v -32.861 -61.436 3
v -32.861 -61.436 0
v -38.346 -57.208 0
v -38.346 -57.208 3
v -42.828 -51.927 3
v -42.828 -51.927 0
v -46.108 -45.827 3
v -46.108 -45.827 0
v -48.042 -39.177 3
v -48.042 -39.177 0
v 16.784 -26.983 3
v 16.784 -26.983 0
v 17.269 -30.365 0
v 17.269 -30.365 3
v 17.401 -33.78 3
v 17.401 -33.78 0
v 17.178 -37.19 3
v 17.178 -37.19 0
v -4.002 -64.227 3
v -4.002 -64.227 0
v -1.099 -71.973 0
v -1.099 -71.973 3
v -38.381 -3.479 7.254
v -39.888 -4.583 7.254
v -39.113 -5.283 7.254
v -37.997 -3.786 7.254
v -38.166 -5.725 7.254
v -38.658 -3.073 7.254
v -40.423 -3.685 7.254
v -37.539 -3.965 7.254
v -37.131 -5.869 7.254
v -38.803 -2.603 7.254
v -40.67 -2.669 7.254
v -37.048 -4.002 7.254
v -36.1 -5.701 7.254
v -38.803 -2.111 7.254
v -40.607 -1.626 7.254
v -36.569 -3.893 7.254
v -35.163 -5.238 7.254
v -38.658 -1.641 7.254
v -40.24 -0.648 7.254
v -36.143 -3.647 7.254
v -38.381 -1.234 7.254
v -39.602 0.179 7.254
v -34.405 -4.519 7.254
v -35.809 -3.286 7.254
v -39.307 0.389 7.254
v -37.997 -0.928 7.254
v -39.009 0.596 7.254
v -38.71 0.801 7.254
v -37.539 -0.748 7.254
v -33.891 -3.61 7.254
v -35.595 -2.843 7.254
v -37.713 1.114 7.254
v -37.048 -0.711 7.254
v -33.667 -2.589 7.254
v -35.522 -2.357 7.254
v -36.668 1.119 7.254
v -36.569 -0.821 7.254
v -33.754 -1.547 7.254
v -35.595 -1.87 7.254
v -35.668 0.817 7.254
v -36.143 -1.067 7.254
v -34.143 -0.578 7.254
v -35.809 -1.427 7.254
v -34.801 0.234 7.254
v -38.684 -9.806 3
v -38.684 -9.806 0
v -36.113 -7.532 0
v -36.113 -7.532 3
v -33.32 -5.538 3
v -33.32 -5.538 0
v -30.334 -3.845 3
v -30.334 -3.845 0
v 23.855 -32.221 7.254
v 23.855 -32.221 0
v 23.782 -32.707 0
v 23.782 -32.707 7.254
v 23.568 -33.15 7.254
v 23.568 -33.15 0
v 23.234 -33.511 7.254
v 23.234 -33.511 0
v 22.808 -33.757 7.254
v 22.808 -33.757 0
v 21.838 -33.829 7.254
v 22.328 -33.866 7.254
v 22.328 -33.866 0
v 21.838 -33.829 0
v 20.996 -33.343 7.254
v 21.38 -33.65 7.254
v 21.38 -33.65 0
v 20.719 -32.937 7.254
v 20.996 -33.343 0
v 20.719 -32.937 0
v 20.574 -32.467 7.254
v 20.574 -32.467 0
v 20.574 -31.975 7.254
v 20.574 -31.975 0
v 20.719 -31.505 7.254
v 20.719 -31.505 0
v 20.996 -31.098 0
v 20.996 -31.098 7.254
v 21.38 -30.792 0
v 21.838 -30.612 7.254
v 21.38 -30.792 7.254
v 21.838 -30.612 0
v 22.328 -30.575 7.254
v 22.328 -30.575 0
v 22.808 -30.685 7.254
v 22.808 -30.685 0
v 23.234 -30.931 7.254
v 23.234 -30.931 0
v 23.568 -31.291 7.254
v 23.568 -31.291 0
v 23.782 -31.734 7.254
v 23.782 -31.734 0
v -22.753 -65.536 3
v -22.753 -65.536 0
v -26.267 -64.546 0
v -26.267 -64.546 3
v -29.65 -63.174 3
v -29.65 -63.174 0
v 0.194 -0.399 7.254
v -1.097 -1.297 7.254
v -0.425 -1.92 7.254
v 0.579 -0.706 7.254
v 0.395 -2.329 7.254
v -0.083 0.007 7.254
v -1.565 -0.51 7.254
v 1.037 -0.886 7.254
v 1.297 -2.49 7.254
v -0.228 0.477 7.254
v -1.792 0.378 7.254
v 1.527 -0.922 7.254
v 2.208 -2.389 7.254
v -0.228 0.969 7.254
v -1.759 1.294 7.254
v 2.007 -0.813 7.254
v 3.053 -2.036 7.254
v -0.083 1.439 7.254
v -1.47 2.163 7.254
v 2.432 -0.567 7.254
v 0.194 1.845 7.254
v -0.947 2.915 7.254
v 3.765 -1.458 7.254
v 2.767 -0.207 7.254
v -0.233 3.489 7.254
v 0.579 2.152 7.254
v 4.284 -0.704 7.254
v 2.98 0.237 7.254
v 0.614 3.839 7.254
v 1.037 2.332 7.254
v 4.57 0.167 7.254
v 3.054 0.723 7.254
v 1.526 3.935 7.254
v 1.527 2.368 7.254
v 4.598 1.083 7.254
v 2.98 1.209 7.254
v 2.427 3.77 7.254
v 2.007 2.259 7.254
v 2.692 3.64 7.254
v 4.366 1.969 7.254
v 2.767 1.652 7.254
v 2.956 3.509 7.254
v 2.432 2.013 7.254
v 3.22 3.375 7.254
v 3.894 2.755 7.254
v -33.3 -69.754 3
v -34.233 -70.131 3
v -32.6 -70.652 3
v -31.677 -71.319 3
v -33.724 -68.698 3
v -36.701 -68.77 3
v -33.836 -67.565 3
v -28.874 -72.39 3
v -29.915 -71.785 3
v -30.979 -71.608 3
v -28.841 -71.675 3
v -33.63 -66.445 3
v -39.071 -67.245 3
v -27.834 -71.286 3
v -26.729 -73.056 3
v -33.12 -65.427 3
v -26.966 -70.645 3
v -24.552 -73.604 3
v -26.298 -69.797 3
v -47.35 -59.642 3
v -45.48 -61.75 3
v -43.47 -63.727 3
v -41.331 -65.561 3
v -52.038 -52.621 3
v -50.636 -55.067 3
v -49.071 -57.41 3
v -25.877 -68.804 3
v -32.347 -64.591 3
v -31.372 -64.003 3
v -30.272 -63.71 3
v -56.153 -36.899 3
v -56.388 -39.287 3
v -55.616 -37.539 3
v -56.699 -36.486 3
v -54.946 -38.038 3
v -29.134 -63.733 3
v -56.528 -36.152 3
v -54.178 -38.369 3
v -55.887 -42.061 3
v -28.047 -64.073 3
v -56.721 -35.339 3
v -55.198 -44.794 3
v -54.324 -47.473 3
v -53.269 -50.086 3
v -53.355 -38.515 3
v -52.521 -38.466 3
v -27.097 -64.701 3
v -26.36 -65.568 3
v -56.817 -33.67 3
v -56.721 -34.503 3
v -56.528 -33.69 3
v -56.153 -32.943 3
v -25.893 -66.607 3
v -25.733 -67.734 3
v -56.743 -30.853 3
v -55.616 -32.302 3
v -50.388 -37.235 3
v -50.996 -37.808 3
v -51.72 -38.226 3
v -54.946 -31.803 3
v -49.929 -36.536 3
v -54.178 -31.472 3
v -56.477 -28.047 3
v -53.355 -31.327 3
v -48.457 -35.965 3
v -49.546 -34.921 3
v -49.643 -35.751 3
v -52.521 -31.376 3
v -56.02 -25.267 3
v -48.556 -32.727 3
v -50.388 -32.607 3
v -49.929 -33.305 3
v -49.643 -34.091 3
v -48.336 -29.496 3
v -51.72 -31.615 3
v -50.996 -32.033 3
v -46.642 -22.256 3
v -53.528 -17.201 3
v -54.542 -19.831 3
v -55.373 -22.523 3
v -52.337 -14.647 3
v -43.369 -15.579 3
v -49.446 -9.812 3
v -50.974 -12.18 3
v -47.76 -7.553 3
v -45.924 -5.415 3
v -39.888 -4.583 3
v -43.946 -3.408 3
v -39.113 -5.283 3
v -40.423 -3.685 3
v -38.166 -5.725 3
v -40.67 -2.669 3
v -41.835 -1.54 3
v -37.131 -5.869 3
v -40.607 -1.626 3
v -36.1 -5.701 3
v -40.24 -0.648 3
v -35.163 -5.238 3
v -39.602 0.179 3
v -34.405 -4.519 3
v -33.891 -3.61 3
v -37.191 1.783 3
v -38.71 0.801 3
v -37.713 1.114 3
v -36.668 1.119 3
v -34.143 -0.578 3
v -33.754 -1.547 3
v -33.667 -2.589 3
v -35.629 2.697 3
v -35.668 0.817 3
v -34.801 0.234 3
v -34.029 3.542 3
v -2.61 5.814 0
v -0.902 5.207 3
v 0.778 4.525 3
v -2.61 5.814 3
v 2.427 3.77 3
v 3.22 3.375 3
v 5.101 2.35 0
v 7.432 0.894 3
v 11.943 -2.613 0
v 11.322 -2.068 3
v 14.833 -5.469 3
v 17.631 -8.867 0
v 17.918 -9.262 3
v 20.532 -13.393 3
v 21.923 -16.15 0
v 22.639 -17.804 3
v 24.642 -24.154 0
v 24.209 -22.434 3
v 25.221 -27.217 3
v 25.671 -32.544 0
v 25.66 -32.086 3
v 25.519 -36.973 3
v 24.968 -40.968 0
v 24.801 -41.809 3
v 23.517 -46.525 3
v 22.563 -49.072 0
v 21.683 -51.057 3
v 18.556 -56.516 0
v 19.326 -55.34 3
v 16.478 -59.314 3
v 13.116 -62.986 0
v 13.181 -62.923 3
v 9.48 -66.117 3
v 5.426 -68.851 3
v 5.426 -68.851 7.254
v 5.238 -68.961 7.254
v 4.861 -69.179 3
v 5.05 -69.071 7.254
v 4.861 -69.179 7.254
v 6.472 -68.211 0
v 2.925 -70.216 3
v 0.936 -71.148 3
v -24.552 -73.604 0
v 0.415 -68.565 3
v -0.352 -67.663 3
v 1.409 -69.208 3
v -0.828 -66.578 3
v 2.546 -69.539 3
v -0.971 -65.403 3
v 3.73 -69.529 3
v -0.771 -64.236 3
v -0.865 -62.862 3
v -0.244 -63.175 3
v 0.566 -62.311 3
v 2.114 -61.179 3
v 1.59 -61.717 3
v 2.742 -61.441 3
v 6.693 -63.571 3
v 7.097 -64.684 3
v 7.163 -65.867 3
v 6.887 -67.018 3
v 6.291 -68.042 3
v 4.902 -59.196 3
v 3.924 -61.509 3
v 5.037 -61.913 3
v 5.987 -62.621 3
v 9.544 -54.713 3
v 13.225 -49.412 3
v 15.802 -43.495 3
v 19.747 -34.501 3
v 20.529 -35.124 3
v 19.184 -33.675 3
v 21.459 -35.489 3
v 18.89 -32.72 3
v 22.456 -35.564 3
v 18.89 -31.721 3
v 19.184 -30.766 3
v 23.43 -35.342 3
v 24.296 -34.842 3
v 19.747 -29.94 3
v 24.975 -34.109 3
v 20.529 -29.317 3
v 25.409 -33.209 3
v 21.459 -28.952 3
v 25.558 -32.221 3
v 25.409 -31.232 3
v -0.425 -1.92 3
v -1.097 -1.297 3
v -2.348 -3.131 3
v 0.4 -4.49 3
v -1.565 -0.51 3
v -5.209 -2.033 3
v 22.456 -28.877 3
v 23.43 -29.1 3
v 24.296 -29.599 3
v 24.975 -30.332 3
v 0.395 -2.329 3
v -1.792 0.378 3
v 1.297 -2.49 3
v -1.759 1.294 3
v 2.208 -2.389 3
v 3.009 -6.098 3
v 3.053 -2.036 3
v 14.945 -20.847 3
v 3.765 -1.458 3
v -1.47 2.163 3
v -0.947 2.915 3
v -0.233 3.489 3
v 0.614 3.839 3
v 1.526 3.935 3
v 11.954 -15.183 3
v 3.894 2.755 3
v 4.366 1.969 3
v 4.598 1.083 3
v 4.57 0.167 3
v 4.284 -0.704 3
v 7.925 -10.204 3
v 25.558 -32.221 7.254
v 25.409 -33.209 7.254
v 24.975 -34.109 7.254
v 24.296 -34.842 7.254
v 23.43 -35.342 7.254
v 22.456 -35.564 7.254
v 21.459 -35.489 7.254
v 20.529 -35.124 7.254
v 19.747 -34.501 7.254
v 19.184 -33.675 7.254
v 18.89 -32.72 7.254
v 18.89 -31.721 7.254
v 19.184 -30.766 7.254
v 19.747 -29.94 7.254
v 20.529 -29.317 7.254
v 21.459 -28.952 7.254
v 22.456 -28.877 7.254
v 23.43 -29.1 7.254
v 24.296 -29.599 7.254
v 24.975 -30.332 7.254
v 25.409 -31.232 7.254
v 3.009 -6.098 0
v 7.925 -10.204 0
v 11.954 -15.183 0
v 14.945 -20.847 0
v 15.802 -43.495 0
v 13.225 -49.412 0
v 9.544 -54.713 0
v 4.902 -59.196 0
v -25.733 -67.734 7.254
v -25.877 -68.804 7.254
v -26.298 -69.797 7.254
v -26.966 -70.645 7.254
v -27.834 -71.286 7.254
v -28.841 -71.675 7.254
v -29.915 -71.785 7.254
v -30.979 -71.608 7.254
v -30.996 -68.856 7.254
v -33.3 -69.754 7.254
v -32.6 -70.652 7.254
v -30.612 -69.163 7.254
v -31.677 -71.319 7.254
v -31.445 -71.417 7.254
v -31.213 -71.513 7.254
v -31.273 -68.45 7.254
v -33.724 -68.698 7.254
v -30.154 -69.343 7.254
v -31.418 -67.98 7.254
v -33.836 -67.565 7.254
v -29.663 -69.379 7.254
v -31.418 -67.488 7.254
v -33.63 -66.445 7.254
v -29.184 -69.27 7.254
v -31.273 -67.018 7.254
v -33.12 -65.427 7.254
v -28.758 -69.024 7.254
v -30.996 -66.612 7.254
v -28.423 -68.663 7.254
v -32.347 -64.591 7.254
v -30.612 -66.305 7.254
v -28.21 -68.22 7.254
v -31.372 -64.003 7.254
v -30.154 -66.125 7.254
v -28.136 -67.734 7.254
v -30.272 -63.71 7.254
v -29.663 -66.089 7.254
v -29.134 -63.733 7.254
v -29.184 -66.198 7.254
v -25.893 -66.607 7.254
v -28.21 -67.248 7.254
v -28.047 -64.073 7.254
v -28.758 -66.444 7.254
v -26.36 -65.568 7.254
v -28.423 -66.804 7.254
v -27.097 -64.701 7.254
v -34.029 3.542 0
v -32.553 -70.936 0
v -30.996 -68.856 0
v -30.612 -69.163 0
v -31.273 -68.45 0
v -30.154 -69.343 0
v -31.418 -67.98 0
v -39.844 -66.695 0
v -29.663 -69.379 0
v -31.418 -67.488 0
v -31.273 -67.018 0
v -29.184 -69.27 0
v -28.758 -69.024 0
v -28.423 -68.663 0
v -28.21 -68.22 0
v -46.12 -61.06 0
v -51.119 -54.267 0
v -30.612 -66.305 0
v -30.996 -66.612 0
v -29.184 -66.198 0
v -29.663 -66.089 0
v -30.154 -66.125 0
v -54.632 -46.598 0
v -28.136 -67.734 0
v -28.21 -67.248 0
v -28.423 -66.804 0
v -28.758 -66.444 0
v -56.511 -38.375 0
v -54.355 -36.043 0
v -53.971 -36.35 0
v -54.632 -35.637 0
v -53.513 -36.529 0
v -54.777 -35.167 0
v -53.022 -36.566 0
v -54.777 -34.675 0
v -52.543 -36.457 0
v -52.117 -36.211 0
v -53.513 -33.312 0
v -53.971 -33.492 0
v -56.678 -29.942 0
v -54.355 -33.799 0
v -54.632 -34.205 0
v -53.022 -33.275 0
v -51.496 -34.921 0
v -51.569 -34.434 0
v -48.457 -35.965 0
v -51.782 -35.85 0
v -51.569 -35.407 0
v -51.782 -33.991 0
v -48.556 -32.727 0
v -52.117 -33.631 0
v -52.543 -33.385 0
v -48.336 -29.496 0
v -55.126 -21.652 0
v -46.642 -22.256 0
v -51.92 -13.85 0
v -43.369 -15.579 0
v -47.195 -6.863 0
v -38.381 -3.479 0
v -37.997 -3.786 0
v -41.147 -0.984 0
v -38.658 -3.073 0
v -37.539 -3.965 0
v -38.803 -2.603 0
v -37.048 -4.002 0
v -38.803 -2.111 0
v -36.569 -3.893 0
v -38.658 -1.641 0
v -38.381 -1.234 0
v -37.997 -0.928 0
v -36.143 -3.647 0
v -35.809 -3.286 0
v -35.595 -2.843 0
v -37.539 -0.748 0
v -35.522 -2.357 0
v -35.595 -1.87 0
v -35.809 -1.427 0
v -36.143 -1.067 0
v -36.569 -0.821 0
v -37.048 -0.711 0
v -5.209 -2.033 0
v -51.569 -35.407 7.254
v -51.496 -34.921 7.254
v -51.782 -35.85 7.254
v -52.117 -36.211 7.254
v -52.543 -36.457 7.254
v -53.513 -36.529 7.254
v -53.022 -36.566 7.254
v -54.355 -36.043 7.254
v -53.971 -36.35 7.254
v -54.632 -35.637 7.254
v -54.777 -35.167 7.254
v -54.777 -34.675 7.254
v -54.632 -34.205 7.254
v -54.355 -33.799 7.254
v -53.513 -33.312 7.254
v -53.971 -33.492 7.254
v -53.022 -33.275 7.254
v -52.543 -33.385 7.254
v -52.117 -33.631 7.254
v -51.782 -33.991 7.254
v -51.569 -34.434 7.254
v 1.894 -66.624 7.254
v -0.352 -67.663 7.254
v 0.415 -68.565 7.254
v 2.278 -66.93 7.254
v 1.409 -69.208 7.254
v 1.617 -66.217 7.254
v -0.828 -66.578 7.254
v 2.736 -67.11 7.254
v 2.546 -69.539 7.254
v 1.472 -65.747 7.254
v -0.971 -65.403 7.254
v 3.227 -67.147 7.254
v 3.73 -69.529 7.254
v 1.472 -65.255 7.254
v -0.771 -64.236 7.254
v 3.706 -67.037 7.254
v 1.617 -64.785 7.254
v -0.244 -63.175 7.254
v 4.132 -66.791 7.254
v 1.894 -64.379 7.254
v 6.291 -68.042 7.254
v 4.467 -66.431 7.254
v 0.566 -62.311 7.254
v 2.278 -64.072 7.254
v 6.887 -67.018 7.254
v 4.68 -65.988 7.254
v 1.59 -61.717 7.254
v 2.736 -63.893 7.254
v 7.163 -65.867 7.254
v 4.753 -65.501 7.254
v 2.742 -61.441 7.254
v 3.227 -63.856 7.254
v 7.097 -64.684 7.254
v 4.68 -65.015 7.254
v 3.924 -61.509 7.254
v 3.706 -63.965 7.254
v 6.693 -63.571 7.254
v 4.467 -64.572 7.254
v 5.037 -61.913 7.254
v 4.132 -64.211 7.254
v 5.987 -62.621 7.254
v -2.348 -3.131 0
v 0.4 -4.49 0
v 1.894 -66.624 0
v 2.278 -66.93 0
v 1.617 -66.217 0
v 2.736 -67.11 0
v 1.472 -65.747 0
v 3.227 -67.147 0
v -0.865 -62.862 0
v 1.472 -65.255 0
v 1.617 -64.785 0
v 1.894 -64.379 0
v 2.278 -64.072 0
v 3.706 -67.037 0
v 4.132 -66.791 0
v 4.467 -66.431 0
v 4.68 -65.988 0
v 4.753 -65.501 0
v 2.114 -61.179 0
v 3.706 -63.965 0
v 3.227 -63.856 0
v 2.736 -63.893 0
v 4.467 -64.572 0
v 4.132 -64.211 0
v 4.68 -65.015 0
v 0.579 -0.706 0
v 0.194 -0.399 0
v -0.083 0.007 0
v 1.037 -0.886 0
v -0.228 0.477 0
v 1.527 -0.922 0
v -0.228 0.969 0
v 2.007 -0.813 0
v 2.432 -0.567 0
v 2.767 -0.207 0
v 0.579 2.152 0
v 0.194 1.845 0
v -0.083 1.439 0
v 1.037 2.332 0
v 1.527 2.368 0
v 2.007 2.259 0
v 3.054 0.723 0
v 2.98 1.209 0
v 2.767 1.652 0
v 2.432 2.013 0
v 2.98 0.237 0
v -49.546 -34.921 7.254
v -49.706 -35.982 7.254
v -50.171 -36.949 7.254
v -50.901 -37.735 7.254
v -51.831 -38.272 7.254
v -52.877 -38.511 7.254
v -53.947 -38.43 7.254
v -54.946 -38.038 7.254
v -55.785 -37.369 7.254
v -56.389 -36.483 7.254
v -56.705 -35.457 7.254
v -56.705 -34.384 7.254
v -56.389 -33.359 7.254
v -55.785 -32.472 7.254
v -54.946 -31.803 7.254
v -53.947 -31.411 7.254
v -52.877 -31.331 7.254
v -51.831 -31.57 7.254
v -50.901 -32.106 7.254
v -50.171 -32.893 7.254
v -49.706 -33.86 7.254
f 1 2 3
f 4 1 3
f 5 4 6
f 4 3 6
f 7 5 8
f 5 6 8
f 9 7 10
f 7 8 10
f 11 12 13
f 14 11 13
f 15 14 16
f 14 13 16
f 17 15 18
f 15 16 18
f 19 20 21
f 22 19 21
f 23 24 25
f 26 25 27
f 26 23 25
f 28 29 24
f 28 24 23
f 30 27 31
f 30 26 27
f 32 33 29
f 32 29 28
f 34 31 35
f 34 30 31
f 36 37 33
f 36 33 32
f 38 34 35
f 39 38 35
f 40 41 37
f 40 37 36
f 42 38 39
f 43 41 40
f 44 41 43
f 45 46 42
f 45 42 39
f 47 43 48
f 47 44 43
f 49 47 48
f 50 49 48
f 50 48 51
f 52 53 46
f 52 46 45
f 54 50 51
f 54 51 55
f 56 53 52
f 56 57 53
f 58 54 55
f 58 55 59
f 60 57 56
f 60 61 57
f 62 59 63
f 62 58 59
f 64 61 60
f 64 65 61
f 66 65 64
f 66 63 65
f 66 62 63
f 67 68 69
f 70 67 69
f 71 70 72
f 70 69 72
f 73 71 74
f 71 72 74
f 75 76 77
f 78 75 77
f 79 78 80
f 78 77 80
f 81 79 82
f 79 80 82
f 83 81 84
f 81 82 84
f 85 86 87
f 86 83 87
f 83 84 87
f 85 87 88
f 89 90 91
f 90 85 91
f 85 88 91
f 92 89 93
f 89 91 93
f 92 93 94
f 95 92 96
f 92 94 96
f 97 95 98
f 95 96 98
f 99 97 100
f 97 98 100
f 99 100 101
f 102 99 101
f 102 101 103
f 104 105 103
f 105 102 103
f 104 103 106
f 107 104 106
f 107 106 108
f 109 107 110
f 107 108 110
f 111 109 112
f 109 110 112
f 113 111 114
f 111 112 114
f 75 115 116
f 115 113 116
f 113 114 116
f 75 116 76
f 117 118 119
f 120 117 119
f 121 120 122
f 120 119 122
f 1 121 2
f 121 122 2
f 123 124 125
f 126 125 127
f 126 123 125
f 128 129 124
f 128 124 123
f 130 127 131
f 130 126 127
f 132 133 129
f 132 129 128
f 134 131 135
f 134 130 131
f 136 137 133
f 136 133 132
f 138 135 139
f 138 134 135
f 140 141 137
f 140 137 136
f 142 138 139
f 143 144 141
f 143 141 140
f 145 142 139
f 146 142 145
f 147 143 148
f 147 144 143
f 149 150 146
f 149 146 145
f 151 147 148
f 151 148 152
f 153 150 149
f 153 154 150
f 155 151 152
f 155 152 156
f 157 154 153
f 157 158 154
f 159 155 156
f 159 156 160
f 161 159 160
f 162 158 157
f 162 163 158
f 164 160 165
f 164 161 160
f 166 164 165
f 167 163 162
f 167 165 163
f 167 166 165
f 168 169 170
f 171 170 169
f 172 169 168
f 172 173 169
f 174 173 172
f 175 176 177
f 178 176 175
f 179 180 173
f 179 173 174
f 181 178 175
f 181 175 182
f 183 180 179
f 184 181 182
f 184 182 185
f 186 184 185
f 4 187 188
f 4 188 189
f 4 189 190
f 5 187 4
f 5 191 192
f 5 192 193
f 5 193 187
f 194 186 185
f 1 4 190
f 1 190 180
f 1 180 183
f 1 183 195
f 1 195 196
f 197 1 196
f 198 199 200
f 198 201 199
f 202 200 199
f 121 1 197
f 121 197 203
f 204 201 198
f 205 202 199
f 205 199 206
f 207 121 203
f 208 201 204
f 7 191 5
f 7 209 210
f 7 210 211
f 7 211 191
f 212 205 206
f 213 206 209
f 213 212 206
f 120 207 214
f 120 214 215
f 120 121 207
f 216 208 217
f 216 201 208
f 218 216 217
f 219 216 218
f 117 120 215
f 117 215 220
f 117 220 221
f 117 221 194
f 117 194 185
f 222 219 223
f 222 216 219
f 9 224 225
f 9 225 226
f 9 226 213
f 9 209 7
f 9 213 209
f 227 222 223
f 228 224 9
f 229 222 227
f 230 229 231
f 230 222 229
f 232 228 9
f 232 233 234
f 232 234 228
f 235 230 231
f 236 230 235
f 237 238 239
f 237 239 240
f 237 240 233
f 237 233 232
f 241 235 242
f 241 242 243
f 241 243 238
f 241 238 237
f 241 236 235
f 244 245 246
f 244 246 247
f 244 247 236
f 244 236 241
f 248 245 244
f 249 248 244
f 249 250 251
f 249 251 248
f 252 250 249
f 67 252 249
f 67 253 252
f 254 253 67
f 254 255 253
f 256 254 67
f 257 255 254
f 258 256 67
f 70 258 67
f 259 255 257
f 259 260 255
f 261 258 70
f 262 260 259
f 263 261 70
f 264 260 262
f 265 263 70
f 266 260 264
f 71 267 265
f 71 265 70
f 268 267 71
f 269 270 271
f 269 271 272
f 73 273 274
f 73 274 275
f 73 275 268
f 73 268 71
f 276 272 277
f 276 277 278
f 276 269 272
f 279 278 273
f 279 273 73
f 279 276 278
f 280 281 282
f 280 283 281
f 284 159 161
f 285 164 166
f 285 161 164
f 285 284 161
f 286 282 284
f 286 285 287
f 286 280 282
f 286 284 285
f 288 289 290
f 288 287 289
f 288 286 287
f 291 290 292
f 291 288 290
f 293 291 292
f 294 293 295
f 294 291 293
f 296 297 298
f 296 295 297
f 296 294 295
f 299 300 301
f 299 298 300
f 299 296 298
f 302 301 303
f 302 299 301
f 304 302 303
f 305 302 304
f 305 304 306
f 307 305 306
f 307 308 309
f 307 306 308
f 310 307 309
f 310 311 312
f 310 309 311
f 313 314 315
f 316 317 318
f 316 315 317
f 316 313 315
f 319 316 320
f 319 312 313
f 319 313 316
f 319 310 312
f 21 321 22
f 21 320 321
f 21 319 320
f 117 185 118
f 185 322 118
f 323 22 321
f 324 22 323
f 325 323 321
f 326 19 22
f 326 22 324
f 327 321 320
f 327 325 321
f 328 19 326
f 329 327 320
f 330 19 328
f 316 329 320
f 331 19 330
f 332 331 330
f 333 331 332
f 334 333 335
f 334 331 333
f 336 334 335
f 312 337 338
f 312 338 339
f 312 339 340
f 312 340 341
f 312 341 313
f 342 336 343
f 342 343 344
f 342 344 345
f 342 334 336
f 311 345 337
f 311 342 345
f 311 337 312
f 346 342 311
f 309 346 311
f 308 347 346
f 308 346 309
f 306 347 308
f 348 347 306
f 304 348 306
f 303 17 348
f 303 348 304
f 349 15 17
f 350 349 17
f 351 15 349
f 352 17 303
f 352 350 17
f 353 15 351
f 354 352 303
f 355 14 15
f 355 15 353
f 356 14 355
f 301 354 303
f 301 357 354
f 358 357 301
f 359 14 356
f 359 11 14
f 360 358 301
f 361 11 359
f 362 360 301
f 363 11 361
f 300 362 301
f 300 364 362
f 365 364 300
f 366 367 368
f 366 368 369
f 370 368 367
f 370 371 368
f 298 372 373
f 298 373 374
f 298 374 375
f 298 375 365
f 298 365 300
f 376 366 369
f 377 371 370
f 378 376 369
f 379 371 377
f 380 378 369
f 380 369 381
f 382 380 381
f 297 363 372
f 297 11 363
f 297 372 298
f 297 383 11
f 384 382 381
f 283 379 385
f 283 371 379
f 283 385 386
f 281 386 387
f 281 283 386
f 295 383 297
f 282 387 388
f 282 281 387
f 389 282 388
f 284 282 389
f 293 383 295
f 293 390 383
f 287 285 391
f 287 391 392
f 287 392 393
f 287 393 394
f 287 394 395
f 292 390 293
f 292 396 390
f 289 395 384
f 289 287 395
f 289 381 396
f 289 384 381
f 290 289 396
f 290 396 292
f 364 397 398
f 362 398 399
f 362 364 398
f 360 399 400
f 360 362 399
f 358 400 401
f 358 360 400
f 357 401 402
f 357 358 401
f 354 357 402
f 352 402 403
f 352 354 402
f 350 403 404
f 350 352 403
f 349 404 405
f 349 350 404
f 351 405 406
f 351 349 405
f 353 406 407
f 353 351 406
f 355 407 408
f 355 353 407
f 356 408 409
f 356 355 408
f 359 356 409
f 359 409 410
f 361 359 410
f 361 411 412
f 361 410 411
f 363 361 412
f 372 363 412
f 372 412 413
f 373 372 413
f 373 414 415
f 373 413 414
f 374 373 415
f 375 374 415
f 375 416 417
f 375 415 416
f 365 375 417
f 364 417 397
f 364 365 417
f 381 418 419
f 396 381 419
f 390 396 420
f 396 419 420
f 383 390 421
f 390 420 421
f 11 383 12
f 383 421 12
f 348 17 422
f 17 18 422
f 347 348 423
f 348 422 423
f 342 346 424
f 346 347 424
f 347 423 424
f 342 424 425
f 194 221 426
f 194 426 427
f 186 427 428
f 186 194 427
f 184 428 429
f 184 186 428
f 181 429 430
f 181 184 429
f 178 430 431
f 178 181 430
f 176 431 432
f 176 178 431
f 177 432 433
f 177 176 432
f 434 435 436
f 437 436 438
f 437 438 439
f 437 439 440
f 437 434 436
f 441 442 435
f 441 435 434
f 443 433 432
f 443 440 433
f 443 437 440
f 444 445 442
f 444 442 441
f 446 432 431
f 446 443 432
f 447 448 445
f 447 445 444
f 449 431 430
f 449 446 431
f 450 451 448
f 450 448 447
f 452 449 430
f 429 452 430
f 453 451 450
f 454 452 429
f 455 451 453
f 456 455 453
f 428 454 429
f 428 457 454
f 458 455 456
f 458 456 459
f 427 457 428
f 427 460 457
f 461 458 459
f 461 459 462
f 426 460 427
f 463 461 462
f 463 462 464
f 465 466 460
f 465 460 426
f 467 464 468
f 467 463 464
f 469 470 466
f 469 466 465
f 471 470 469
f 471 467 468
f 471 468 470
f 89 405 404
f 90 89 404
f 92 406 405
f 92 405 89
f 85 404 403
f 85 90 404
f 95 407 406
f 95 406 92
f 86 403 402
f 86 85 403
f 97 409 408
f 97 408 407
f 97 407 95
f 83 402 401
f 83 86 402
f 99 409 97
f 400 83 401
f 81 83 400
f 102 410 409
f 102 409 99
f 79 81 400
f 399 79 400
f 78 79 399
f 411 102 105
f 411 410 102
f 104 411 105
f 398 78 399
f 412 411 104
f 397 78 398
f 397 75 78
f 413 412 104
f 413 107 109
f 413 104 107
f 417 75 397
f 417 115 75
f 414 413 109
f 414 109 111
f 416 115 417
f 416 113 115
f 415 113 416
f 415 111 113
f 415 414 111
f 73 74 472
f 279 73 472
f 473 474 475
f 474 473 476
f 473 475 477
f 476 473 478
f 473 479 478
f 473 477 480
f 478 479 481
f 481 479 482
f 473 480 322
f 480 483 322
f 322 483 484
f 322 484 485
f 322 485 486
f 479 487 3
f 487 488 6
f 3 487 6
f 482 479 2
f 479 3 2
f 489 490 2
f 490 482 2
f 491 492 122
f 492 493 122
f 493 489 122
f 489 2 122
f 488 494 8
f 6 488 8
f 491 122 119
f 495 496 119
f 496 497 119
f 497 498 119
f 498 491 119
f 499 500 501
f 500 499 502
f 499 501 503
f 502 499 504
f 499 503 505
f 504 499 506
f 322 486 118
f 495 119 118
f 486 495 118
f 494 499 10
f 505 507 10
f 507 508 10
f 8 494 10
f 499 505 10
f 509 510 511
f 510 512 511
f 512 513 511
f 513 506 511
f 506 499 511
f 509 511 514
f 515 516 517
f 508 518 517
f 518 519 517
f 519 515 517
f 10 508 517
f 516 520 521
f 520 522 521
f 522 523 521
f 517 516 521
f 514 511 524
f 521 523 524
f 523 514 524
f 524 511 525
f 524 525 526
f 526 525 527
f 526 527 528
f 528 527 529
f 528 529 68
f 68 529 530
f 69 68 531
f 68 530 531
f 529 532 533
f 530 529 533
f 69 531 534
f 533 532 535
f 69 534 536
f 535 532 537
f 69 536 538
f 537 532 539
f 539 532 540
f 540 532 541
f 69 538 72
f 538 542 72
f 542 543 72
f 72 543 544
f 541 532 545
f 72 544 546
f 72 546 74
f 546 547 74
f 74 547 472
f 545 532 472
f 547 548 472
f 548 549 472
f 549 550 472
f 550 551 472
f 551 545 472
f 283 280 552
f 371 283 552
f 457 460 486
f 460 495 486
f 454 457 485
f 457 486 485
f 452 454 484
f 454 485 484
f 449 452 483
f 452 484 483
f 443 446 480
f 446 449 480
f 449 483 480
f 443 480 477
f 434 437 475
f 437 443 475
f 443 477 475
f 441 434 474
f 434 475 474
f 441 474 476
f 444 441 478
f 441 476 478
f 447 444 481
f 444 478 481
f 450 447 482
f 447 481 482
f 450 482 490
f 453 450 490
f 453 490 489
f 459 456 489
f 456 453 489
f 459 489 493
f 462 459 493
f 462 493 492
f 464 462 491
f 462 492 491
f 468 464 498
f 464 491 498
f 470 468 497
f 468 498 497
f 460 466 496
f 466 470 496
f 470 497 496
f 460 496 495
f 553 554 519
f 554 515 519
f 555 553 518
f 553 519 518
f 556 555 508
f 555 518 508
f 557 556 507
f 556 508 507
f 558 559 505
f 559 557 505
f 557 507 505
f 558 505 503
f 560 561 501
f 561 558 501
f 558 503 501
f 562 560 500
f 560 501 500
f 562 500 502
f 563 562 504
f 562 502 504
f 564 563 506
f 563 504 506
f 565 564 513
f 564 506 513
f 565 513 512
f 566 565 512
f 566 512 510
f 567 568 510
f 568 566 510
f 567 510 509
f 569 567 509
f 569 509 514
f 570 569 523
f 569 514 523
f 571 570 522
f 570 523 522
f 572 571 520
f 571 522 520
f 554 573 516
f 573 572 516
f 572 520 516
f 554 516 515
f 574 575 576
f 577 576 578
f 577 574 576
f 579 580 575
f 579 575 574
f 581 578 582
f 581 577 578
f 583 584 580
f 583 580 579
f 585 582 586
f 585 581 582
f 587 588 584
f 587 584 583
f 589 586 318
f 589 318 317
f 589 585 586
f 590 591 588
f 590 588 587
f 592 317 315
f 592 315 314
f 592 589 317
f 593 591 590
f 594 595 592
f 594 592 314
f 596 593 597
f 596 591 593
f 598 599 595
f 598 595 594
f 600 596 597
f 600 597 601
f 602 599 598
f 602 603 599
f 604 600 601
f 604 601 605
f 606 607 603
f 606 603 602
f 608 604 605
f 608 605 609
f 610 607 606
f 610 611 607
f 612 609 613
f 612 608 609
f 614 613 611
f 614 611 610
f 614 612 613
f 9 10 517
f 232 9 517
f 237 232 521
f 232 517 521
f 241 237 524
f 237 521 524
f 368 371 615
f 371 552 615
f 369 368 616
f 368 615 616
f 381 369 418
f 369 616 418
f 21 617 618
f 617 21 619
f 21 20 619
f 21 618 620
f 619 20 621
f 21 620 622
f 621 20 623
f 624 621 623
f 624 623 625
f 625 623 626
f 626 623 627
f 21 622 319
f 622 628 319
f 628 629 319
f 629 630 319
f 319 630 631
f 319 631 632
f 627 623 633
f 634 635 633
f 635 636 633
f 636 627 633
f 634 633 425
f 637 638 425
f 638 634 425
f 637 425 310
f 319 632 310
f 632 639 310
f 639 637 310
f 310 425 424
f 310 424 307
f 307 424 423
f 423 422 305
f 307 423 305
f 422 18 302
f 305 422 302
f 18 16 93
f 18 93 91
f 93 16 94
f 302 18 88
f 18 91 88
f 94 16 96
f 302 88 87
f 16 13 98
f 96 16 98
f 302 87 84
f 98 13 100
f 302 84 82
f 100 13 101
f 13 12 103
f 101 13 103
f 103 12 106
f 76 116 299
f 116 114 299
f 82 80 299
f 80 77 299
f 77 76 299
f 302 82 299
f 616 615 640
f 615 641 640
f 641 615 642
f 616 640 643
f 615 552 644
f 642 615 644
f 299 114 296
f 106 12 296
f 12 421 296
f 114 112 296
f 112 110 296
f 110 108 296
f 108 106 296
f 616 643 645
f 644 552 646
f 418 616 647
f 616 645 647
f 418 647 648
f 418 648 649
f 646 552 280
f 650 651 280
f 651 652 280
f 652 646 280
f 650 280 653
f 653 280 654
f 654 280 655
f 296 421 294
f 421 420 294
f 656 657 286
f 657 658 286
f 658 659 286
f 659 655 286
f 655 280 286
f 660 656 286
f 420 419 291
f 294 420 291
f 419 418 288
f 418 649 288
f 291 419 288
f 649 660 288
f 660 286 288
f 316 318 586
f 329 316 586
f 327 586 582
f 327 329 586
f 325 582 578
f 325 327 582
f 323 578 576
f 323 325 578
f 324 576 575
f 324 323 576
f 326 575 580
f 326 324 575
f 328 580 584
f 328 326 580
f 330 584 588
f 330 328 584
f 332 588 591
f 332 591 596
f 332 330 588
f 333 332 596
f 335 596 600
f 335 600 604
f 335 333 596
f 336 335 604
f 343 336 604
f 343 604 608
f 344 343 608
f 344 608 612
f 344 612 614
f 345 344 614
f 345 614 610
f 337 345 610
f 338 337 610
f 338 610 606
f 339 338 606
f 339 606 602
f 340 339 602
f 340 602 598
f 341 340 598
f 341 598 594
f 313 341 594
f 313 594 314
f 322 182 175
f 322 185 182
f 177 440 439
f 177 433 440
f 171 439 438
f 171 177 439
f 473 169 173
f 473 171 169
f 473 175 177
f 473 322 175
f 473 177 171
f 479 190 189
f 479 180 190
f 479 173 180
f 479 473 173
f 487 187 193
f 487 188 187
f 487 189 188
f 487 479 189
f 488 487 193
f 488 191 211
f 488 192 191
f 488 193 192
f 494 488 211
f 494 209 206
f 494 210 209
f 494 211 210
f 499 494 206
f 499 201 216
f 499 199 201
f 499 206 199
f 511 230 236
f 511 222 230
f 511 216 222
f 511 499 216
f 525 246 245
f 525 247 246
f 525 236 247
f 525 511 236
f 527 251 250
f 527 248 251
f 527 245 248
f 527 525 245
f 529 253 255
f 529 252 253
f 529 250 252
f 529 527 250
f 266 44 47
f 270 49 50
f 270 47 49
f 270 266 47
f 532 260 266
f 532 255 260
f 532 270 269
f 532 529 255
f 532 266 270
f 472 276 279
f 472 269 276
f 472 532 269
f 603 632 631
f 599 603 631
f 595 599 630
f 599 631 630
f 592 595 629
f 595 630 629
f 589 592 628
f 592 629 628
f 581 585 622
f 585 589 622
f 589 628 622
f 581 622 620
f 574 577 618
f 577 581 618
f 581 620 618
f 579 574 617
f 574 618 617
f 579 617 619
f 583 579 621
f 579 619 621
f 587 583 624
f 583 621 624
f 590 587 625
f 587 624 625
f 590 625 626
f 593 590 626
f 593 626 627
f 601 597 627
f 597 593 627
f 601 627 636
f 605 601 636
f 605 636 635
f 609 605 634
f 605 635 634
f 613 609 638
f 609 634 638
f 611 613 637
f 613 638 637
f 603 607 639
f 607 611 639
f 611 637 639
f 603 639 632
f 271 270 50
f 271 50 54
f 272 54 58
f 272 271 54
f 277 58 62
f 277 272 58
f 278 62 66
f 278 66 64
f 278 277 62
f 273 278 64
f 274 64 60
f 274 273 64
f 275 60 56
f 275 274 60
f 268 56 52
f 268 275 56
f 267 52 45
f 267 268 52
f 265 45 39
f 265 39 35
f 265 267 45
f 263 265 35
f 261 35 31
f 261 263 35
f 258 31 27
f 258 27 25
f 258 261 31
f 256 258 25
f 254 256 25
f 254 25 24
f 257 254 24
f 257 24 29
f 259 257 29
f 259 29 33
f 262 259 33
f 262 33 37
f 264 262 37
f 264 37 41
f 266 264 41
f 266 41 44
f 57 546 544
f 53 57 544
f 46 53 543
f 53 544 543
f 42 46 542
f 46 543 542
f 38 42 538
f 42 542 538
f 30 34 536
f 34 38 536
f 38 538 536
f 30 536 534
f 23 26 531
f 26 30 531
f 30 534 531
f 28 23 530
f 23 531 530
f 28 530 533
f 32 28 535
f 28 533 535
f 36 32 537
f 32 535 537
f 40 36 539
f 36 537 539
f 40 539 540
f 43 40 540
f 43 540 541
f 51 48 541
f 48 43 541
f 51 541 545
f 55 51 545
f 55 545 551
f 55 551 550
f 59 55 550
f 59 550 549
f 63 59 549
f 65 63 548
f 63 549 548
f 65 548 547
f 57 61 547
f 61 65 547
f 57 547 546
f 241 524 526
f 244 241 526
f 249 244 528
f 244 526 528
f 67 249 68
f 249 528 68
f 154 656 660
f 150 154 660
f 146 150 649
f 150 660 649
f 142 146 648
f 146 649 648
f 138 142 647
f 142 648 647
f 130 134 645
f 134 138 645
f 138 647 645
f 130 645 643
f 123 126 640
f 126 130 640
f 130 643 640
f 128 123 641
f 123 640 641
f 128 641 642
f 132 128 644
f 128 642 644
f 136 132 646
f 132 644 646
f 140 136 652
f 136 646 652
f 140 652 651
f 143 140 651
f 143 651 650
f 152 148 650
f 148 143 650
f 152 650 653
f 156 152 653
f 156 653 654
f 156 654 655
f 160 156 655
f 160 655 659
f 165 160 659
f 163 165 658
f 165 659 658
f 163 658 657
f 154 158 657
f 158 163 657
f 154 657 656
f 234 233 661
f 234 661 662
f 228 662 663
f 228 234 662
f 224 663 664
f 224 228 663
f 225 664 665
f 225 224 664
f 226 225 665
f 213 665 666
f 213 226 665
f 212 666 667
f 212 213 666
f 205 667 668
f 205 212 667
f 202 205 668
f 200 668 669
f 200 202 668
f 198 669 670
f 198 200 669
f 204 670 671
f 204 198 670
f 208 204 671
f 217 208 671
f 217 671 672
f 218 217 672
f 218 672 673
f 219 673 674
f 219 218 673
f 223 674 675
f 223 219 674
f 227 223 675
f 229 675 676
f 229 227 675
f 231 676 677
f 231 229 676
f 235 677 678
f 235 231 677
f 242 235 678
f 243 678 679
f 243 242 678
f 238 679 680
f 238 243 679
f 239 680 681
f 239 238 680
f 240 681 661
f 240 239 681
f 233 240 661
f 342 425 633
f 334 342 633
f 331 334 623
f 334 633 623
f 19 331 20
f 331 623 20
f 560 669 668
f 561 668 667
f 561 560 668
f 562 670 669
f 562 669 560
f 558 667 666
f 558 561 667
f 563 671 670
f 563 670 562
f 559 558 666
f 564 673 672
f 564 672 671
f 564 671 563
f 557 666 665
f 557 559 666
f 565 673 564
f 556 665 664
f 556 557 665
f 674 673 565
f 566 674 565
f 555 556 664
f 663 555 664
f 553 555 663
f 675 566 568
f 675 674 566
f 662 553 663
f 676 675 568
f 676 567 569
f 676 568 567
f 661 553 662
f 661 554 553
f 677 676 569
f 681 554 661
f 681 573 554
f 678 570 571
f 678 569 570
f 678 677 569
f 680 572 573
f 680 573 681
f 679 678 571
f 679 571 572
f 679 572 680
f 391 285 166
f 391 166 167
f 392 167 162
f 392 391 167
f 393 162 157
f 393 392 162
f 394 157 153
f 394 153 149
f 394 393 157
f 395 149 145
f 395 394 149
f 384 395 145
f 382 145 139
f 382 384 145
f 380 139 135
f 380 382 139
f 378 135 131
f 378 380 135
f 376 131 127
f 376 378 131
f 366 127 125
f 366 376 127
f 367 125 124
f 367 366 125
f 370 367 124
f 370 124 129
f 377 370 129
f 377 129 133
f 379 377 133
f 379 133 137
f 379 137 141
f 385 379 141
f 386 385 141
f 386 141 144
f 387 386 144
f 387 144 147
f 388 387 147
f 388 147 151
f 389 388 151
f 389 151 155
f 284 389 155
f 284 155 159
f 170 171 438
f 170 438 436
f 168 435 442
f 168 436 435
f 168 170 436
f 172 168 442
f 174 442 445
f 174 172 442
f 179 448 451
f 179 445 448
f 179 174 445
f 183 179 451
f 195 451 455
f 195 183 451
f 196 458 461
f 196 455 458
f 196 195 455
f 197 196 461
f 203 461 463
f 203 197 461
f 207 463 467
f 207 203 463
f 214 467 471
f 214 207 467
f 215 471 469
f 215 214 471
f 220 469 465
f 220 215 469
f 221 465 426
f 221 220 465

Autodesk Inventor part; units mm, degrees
ref_plane "YZ Plane" through (0, 0, 0) normal (1, 0, 0) x (0, 1, 0)
ref_plane "XZ Plane" through (0, 0, 0) normal (0, 1, 0) x (-1, 0, 0)
ref_plane "XY Plane" through (0, 0, 0) normal (0, 0, 1) x (1, 0, 0)
ref_plane "Work Plane1" through (0, 0, 0.254) normal (0, 0, 1) x (1, 0, 0)
sketch "Sketch1" plane through (0, 0, 0.254) normal (0, 0, 1) x (1, 0, 0)
  line L0 (-30.3342, -3.8452) -> (-34.0294, 3.542) projected
  arc A0 (-34.0294, 3.542) -> (-24.5515, -73.6045) centre (-15.5698, -33.3456) ccw projected
  line L1 (-24.5515, -73.6045) -> (-22.7534, -65.536) projected
  arc A1 (-32.8607, -61.4358) -> (-22.7534, -65.536) centre (-15.579, -33.3432) ccw projected
  arc A2 (-48.0416, -39.1767) -> (-32.8607, -61.4358) centre (-15.579, -33.3432) ccw projected
  arc A3 (-48.3364, -29.496) -> (-48.0416, -39.1767) centre (-15.579, -33.3432) ccw projected
  arc A4 (-38.6838, -9.8057) -> (-48.3364, -29.496) centre (-15.579, -33.3432) ccw projected
  arc A5 (-30.3342, -3.8452) -> (-38.6838, -9.8057) centre (-15.579, -33.3432) ccw projected
  circle A6 centre (-37.1718, -2.3566) radius 1.65 projected
  circle A7 centre (-53.1457, -34.9208) radius 1.65 projected
  circle A8 centre (-29.7865, -67.7339) radius 1.65 projected
  line L2 (-4.0023, -64.2273) -> (-1.099, -71.9726) projected
  arc A9 (-1.099, -71.9726) -> (-2.6102, 5.8143) centre (-15.5698, -33.3456) ccw projected
  line L3 (-2.6102, 5.8143) -> (-5.2093, -2.0332) projected
  arc A10 (3.0091, -6.0975) -> (-5.2093, -2.0332) centre (-15.579, -33.3432) ccw projected
  arc A11 (16.7844, -26.9826) -> (3.0091, -6.0975) centre (-15.579, -33.3432) ccw projected
  arc A12 (17.1784, -37.1904) -> (16.7844, -26.9826) centre (-15.579, -33.3432) ccw projected
  arc A13 (4.9019, -59.1962) -> (17.1784, -37.1904) centre (-15.579, -33.3432) ccw projected
  arc A14 (-4.0023, -64.2273) -> (4.9019, -59.1962) centre (-15.579, -33.3432) ccw projected
  circle A15 centre (1.4037, 0.7229) radius 1.65 projected
  circle A16 centre (22.2051, -32.2206) radius 1.65 projected
  circle A17 centre (3.1034, -65.5014) radius 1.65 projected
  circle A18 centre (-53.1457, -34.9208) radius 3.5999
  circle A19 centre (-37.1718, -2.3566) radius 3.5122
  circle A20 centre (1.4037, 0.7229) radius 3.2143
  circle A21 centre (22.2051, -32.2206) radius 3.3528
  circle A22 centre (3.1034, -65.5014) radius 4.076
  circle A23 centre (-29.7865, -67.7339) radius 4.0534
  point P0 (0, 0)
  point P1 (2.4269, 3.77)
  point P2 (3.22, 3.3748)
  point P3 (5.4258, -68.851)
  point P4 (4.8616, -69.1787)
  point P5 (-30.9787, -71.6081)
  point P6 (-31.6782, -71.3189)
  point P7 (-39.602, 0.179)
  point P8 (-38.7101, 0.8007)
extrude "Extrusion1" add sketch "Sketch1" along normal blind 7 contours A19 A0 | A23 A0 | A22 A9 | A20 A9 | A18 | A21 picked at (-34.3318, -2.7742) picked at (-26.5918, -67.2698) picked at (6.314, -65.0394) picked at (4.0492, 1.1119)
ref_plane "Work Plane2" through (0, 0, 0) normal (0, 0, 1) x (1, 0, 0)
sketch "Sketch2" plane through (0, 0, 0) normal (0, 0, 1) x (1, 0, 0)
  line L0 (-30.3342, -3.8452) -> (-34.0294, 3.542) projected
  arc A0 (-34.0294, 3.542) -> (-24.5515, -73.6045) centre (-15.5698, -33.3456) ccw projected
  line L1 (-24.5515, -73.6045) -> (-22.7534, -65.536) projected
  arc A1 (-32.8607, -61.4358) -> (-22.7534, -65.536) centre (-15.579, -33.3432) ccw projected
  arc A2 (-48.0416, -39.1767) -> (-32.8607, -61.4358) centre (-15.579, -33.3432) ccw projected
  arc A3 (-48.3364, -29.496) -> (-48.0416, -39.1767) centre (-15.579, -33.3432) ccw projected
  arc A4 (-38.6838, -9.8057) -> (-48.3364, -29.496) centre (-15.579, -33.3432) ccw projected
  arc A5 (-30.3342, -3.8452) -> (-38.6838, -9.8057) centre (-15.579, -33.3432) ccw projected
  circle A6 centre (-37.1718, -2.3566) radius 1.65 projected
  circle A7 centre (-53.1457, -34.9208) radius 1.65 projected
  circle A8 centre (-29.7865, -67.7339) radius 1.65 projected
  line L2 (-4.0023, -64.2273) -> (-1.099, -71.9726) projected
  arc A9 (-1.099, -71.9726) -> (-2.6102, 5.8143) centre (-15.5698, -33.3456) ccw projected
  line L3 (-2.6102, 5.8143) -> (-5.2093, -2.0332) projected
  arc A10 (3.0091, -6.0975) -> (-5.2093, -2.0332) centre (-15.579, -33.3432) ccw projected
  arc A11 (16.7844, -26.9826) -> (3.0091, -6.0975) centre (-15.579, -33.3432) ccw projected
  arc A12 (17.1784, -37.1904) -> (16.7844, -26.9826) centre (-15.579, -33.3432) ccw projected
  arc A13 (4.9019, -59.1962) -> (17.1784, -37.1904) centre (-15.579, -33.3432) ccw projected
  arc A14 (-4.0023, -64.2273) -> (4.9019, -59.1962) centre (-15.579, -33.3432) ccw projected
  circle A15 centre (1.4037, 0.7229) radius 1.65 projected
  circle A16 centre (22.2051, -32.2206) radius 1.65 projected
  circle A17 centre (3.1034, -65.5014) radius 1.65 projected
  point P0 (0, 0)
extrude "Extrusion2" add sketch "Sketch2" along normal blind 3
properties part number "Part5_3DPrint"
